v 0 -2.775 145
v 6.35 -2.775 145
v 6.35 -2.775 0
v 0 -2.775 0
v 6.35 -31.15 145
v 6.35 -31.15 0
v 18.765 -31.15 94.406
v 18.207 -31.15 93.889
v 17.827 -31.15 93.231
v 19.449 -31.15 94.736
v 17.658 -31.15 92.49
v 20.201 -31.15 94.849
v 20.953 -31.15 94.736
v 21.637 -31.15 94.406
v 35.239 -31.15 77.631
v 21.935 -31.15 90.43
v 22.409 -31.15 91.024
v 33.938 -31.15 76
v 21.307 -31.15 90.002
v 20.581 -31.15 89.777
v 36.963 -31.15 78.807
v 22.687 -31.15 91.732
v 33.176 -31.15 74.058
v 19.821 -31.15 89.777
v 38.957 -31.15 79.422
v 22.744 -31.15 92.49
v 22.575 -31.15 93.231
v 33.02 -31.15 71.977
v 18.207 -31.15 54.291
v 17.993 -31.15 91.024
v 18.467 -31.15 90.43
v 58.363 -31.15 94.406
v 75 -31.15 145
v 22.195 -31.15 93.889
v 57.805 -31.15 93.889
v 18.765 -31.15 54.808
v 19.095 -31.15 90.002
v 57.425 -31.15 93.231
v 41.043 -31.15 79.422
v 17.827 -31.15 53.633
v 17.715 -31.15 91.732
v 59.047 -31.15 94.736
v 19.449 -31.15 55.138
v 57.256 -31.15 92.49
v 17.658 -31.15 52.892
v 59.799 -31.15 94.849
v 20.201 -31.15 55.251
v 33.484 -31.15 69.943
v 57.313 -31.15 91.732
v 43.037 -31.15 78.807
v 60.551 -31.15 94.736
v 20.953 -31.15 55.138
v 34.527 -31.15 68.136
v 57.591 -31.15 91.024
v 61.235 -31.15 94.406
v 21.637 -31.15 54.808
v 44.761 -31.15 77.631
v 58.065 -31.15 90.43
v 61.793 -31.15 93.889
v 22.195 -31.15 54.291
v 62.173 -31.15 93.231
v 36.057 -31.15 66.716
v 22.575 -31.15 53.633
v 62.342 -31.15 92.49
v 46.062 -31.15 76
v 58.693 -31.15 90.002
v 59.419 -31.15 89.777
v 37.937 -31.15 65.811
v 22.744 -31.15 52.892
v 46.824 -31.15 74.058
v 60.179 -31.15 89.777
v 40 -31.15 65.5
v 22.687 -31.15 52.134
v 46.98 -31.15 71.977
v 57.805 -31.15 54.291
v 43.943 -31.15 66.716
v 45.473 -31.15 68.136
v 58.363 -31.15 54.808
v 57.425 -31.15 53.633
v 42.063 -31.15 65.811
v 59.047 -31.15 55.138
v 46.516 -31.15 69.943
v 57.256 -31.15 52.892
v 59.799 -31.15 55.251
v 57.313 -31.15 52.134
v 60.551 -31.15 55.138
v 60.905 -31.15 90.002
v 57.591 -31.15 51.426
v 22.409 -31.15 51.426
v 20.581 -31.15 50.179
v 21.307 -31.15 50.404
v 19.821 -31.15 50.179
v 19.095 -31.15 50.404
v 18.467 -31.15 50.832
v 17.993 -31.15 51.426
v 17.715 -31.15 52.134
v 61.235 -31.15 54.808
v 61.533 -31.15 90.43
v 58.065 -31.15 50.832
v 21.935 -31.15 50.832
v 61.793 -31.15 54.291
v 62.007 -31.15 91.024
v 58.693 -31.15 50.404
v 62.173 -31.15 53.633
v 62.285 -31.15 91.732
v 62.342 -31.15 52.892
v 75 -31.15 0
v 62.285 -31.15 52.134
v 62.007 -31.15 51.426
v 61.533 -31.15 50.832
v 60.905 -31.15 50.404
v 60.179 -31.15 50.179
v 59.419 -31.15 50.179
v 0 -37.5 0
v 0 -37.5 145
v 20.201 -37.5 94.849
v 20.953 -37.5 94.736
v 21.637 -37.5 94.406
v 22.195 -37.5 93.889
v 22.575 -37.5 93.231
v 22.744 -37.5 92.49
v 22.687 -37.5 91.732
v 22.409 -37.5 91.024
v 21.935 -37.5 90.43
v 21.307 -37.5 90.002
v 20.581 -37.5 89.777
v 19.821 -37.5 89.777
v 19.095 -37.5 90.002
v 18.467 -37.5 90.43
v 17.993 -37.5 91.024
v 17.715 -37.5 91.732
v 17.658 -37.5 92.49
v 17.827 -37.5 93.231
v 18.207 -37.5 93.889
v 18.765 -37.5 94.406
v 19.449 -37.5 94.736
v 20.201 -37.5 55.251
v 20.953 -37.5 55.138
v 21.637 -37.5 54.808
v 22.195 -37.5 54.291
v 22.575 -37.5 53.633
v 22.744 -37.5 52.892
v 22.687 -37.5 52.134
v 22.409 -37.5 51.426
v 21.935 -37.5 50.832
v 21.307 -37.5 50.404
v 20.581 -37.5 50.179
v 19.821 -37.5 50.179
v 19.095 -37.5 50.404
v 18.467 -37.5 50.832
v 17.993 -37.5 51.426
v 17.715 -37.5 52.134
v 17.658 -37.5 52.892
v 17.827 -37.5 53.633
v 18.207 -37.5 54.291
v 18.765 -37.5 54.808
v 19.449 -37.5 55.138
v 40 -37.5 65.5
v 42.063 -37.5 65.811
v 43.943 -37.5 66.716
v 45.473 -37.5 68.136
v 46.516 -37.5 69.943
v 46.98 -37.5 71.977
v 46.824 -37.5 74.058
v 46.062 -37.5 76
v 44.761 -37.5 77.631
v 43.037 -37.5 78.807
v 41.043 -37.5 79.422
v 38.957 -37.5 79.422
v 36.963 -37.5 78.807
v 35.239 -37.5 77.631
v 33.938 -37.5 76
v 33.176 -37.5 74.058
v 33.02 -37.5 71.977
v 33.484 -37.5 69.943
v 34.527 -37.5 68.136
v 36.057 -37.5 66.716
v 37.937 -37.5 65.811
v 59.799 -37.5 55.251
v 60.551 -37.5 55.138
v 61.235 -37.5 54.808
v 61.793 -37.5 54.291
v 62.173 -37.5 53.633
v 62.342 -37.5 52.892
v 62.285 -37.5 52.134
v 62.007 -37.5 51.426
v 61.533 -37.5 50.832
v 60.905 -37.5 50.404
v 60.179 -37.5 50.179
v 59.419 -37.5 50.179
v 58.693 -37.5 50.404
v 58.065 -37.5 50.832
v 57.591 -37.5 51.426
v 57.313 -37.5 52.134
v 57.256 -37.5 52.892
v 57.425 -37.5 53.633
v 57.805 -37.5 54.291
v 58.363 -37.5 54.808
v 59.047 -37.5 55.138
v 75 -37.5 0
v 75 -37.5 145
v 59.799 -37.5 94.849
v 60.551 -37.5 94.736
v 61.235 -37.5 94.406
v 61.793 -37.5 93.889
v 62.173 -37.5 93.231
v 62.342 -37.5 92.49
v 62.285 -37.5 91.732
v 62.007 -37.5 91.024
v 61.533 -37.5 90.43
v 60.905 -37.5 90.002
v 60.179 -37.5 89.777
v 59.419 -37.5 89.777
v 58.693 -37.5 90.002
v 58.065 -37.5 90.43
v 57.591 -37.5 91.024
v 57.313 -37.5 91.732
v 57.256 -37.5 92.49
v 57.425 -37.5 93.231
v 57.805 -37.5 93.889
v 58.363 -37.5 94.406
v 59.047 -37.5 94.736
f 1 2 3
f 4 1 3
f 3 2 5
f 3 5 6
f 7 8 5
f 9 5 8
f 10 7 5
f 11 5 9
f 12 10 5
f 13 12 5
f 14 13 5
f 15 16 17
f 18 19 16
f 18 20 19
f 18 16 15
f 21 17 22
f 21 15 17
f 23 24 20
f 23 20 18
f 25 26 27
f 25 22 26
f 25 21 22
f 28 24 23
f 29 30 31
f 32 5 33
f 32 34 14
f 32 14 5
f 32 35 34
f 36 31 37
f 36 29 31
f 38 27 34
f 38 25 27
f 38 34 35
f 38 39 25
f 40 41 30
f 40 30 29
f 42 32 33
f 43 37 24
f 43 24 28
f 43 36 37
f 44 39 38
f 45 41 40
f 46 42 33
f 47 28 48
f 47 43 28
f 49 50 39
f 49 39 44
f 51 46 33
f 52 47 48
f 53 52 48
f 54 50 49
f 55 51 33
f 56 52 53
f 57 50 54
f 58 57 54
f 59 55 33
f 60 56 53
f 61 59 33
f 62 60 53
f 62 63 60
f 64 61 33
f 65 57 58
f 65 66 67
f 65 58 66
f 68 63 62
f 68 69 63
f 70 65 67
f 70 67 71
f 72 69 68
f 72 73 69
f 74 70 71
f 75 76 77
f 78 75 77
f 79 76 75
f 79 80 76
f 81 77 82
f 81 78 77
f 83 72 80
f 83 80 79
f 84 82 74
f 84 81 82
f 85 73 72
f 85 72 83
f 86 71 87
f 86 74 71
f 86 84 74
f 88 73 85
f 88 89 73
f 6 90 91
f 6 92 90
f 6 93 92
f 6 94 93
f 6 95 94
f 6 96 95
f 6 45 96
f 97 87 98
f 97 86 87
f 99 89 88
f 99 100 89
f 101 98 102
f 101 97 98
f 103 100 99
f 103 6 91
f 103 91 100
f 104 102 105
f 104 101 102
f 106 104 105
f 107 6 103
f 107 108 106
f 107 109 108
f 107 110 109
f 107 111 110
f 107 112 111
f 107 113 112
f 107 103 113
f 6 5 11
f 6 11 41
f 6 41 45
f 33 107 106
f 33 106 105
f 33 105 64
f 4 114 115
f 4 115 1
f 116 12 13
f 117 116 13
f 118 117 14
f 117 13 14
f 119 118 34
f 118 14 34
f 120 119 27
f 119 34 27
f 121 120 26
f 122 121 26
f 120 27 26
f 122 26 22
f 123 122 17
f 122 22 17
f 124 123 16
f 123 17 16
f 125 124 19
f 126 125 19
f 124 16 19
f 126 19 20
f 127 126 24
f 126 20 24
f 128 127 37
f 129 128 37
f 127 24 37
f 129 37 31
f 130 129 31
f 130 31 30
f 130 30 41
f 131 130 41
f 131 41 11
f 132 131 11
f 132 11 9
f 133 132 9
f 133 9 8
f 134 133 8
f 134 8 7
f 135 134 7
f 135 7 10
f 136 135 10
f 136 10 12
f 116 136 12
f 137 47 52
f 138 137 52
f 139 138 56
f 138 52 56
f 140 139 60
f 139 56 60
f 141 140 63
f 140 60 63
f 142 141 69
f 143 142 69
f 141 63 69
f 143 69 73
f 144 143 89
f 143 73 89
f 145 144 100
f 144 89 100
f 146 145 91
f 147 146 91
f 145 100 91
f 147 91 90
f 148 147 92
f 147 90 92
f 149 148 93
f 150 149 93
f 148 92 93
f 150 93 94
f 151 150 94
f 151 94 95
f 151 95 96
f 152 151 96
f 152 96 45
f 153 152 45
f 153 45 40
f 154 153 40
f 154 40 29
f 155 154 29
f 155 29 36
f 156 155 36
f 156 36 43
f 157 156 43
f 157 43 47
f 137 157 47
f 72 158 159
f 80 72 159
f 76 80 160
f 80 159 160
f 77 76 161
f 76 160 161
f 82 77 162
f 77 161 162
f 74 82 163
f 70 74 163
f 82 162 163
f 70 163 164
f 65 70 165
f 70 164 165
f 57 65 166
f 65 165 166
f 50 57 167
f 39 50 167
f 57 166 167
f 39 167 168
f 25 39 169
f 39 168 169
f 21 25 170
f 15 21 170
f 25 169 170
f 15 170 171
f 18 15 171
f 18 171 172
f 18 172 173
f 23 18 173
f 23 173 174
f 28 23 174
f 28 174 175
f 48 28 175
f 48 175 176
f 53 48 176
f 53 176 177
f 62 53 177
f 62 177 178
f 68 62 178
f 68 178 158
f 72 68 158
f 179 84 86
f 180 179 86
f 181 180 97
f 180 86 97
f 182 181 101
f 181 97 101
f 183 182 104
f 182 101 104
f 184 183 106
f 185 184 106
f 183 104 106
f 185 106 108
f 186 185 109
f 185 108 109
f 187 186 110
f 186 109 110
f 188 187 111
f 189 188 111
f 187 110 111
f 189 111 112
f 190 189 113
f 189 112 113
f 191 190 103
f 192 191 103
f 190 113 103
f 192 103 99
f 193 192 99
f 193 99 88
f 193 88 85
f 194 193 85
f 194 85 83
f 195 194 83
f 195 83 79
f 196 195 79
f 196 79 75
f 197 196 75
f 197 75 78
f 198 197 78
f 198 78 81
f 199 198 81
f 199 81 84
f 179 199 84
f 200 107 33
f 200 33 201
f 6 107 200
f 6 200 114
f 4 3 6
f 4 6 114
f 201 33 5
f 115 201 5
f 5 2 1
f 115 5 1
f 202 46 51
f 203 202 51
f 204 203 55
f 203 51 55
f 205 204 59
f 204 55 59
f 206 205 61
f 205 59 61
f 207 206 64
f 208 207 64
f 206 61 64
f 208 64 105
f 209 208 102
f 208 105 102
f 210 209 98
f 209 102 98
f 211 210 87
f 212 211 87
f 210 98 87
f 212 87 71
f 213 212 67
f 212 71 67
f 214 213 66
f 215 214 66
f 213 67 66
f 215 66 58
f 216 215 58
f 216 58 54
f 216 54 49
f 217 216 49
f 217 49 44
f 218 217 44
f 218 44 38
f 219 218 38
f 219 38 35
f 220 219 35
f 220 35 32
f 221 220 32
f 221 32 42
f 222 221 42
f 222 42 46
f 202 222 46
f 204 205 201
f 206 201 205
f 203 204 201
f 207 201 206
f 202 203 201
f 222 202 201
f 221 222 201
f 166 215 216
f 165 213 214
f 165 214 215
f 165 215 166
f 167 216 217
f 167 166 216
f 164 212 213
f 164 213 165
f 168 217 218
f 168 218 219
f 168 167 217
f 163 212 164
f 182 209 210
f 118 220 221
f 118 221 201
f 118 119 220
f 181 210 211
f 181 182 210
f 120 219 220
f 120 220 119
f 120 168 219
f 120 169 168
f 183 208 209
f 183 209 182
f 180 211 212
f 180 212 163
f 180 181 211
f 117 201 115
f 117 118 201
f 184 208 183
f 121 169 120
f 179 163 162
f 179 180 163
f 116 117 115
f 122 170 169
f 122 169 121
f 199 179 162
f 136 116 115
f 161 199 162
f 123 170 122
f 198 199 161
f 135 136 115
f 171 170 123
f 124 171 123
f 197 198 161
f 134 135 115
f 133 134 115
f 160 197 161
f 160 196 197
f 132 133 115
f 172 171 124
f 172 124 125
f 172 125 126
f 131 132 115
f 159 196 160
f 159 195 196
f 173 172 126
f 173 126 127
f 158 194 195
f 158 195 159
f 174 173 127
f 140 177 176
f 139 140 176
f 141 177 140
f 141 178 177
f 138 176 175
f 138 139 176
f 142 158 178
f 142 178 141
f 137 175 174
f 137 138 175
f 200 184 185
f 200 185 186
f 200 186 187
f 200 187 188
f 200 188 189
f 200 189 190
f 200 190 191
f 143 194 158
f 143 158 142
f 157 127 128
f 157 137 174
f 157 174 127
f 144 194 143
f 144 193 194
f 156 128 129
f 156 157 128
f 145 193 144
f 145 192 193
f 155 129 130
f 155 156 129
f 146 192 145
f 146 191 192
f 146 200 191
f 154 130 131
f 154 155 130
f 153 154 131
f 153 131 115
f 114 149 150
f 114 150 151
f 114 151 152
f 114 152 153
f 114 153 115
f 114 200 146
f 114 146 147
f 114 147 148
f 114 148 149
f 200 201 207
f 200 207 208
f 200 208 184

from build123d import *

# Parameters (mm, degrees)
BOSS_EXTRUDE1_DEPTH = 145
SKETCH2_W           = 68.65
SKETCH2_H           = 145
CUT_EXTRUDE1_DEPTH  = 10
SKETCH3_R           = 7
CUT_EXTRUDE2_DEPTH  = 10
SKETCH4_R           = 2.55
CUT_EXTRUDE3_DEPTH  = 10
SKETCH5_W           = 278.618693002
SKETCH5_H           = 61.467749786
CUT_EXTRUDE4_DEPTH  = 10


with BuildPart() as part:
    # Sketch1 → Boss-Extrude1 (new body)
    with BuildSketch(Plane.XY):
        Polygon((0, -37.5), (0, 37.5), (75, 37.5), (75, 31.15), (6.35, 31.15), (6.35, -31.15), (75, -31.15), (75, -37.5), align=None)
    extrude(amount=BOSS_EXTRUDE1_DEPTH)

    # Sketch2 → Cut-Extrude1 (cut)
    with BuildSketch(Plane(origin=(0, 37.5, 0), x_dir=(1, 0, 0), z_dir=(0, 1, 0))):
        with Locations((40.675, -72.5)):
            Rectangle(SKETCH2_W, SKETCH2_H)
    extrude(amount=-CUT_EXTRUDE1_DEPTH, mode=Mode.SUBTRACT)

    # Sketch3 → Cut-Extrude2 (cut)
    with BuildSketch(Plane.XZ.offset(37.5)):
        with Locations(Location((40, 72.5, 0), (0, 0, 270))):
            Circle(SKETCH3_R)
    extrude(amount=-CUT_EXTRUDE2_DEPTH, mode=Mode.SUBTRACT)

    # Sketch4 → Cut-Extrude3 (cut)
    with BuildSketch(Plane(origin=(0, -31.15, 0), x_dir=(1, 0, 0), z_dir=(0, 1, 0))):
        with Locations(Location((59.798989873, -52.701010127, 0), (0, 0, 270))):
            Circle(SKETCH4_R)
        with Locations(Location((59.798989873, -92.298989873, 0), (0, 0, 270))):
            Circle(SKETCH4_R)
        with Locations(Location((20.201010127, -92.298989873, 0), (0, 0, 270))):
            Circle(SKETCH4_R)
        with Locations(Location((20.201010127, -52.701010127, 0), (0, 0, 270))):
            Circle(SKETCH4_R)
    extrude(amount=-CUT_EXTRUDE3_DEPTH, mode=Mode.SUBTRACT)

    # Sketch5 → Cut-Extrude4 (cut)
    with BuildSketch(Plane(origin=(6.35, 0, 0), x_dir=(0, 0, -1), z_dir=(1, 0, 0))):
        with Locations((-29.250225685, 27.958406515)):
            Rectangle(SKETCH5_W, SKETCH5_H)
    extrude(amount=-CUT_EXTRUDE4_DEPTH, mode=Mode.SUBTRACT)


solid = part.part
